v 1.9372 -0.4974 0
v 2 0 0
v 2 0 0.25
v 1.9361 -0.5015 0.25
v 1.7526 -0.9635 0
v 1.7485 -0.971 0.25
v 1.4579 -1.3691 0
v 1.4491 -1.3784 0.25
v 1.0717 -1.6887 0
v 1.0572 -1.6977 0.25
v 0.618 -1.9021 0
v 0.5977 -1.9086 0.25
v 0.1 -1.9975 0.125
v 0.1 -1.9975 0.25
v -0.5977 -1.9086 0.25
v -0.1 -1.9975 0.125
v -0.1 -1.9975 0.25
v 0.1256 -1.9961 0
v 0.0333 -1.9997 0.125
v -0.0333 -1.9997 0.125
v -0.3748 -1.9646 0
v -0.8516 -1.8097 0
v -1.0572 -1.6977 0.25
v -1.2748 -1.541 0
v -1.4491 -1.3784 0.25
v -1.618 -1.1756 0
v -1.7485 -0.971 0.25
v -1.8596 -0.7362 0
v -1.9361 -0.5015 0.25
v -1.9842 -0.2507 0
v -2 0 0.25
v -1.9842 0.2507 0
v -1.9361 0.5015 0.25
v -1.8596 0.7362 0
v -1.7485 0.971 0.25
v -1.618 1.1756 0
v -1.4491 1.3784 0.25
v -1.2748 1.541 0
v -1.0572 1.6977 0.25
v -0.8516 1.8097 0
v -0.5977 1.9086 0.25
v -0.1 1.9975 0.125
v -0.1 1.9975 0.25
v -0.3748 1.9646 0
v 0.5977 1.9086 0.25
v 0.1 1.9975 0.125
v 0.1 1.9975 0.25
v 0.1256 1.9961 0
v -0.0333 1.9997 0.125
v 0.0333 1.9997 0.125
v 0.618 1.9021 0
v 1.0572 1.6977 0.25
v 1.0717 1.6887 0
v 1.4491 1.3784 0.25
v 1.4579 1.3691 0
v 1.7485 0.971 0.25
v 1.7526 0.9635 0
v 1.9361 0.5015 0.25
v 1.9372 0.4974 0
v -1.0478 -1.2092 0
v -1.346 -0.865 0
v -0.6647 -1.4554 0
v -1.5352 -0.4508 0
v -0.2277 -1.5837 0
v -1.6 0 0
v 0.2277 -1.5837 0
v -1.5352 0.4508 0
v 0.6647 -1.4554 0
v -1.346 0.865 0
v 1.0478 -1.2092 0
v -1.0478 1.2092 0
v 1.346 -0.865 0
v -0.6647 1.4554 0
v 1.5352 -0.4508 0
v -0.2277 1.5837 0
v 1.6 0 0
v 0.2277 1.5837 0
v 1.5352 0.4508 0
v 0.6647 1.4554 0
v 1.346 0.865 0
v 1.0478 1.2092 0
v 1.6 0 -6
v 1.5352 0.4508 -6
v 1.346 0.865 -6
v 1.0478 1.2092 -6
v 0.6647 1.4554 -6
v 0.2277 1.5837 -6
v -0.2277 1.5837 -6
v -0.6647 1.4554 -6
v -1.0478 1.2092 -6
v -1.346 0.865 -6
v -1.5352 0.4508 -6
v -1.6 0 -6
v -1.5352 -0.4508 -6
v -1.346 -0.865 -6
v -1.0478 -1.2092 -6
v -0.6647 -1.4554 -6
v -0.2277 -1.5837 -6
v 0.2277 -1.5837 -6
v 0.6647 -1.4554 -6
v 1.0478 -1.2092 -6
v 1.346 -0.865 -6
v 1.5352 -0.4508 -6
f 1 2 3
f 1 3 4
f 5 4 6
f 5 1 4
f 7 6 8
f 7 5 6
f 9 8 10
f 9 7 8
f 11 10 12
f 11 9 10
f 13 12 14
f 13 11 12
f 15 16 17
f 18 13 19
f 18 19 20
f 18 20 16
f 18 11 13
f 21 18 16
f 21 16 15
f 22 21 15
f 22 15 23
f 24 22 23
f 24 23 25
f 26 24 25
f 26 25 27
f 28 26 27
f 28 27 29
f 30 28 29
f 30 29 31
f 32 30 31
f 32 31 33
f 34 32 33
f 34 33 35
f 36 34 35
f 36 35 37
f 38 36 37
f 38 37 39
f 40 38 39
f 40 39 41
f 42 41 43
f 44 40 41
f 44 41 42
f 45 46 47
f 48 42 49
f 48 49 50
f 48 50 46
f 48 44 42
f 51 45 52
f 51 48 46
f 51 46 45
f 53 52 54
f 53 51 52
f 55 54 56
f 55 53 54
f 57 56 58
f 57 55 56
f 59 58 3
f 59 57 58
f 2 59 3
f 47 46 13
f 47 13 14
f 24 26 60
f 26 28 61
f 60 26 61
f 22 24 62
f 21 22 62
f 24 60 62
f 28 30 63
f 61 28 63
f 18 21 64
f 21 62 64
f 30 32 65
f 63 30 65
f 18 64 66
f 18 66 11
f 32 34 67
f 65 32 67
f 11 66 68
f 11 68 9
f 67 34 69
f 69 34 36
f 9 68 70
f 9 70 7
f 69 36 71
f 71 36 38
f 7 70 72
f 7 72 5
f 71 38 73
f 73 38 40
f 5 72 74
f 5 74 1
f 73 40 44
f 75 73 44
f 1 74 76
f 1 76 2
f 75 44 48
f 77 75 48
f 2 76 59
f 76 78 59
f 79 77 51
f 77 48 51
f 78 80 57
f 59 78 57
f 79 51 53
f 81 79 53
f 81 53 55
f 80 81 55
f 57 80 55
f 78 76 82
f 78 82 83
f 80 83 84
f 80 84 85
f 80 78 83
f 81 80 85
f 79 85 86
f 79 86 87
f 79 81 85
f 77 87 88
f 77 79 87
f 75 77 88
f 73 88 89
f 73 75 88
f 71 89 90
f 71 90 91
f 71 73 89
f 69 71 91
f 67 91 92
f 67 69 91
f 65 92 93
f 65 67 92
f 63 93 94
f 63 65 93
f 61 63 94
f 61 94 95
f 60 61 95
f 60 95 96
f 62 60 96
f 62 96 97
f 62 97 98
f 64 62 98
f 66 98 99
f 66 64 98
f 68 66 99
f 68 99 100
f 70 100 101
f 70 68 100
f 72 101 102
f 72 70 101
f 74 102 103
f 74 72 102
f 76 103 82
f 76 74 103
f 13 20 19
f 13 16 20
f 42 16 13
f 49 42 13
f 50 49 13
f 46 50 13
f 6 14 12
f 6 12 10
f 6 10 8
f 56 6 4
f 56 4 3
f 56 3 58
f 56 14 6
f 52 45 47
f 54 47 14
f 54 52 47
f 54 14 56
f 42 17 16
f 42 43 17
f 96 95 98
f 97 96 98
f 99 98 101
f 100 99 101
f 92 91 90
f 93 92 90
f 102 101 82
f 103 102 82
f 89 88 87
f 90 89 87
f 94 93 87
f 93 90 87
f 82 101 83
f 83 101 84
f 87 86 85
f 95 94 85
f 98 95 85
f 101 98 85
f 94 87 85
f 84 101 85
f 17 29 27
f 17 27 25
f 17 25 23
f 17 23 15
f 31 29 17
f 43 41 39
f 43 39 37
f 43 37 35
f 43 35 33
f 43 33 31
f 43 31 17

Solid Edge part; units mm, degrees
sketch "Sketch1" plane through (0, 0, 0) normal (0, 0, 1) x (1, 0, 0)
  circle A0 centre (0, 0) radius 1.6
extrude "Protrusion1" add sketch "Sketch1" against normal blind 6
sketch "Sketch2" plane through (0, 0, 0) normal (0, 0, 1) x (1, 0, 0)
  circle A0 centre (0, 0) radius 2
extrude "ExtrudedProtrusion_2" add sketch "Sketch2" along normal blind 0.25
sketch "Sketch3" plane through (0, 0, 0) normal (0, -1, 0) x (1, 0, 0)
  line L0 (0.1, 0.125) -> (0.1, 0.25)
  line L1 (0.1, 0.25) -> (-0.1, 0.25)
  line L2 (-0.1, 0.25) -> (-0.1, 0.125)
  line L3 (-0.1, 0.125) -> (0.1, 0.125)
extrude "Cutout1" cut sketch "Sketch3" against normal up to next
sketch "Sketch4" plane through (0, 0, 0) normal (0, -1, 0) x (1, 0, 0)
  line L0 (0.1, 0.25) -> (-0.1, 0.25)
  line L1 (-0.1, 0.25) -> (-0.1, 0.125)
  line L2 (-0.1, 0.125) -> (0.1, 0.125)
  line L3 (0.1, 0.125) -> (0.1, 0.25)
extrude "Cutout2" cut sketch "Sketch4" along normal up to next
